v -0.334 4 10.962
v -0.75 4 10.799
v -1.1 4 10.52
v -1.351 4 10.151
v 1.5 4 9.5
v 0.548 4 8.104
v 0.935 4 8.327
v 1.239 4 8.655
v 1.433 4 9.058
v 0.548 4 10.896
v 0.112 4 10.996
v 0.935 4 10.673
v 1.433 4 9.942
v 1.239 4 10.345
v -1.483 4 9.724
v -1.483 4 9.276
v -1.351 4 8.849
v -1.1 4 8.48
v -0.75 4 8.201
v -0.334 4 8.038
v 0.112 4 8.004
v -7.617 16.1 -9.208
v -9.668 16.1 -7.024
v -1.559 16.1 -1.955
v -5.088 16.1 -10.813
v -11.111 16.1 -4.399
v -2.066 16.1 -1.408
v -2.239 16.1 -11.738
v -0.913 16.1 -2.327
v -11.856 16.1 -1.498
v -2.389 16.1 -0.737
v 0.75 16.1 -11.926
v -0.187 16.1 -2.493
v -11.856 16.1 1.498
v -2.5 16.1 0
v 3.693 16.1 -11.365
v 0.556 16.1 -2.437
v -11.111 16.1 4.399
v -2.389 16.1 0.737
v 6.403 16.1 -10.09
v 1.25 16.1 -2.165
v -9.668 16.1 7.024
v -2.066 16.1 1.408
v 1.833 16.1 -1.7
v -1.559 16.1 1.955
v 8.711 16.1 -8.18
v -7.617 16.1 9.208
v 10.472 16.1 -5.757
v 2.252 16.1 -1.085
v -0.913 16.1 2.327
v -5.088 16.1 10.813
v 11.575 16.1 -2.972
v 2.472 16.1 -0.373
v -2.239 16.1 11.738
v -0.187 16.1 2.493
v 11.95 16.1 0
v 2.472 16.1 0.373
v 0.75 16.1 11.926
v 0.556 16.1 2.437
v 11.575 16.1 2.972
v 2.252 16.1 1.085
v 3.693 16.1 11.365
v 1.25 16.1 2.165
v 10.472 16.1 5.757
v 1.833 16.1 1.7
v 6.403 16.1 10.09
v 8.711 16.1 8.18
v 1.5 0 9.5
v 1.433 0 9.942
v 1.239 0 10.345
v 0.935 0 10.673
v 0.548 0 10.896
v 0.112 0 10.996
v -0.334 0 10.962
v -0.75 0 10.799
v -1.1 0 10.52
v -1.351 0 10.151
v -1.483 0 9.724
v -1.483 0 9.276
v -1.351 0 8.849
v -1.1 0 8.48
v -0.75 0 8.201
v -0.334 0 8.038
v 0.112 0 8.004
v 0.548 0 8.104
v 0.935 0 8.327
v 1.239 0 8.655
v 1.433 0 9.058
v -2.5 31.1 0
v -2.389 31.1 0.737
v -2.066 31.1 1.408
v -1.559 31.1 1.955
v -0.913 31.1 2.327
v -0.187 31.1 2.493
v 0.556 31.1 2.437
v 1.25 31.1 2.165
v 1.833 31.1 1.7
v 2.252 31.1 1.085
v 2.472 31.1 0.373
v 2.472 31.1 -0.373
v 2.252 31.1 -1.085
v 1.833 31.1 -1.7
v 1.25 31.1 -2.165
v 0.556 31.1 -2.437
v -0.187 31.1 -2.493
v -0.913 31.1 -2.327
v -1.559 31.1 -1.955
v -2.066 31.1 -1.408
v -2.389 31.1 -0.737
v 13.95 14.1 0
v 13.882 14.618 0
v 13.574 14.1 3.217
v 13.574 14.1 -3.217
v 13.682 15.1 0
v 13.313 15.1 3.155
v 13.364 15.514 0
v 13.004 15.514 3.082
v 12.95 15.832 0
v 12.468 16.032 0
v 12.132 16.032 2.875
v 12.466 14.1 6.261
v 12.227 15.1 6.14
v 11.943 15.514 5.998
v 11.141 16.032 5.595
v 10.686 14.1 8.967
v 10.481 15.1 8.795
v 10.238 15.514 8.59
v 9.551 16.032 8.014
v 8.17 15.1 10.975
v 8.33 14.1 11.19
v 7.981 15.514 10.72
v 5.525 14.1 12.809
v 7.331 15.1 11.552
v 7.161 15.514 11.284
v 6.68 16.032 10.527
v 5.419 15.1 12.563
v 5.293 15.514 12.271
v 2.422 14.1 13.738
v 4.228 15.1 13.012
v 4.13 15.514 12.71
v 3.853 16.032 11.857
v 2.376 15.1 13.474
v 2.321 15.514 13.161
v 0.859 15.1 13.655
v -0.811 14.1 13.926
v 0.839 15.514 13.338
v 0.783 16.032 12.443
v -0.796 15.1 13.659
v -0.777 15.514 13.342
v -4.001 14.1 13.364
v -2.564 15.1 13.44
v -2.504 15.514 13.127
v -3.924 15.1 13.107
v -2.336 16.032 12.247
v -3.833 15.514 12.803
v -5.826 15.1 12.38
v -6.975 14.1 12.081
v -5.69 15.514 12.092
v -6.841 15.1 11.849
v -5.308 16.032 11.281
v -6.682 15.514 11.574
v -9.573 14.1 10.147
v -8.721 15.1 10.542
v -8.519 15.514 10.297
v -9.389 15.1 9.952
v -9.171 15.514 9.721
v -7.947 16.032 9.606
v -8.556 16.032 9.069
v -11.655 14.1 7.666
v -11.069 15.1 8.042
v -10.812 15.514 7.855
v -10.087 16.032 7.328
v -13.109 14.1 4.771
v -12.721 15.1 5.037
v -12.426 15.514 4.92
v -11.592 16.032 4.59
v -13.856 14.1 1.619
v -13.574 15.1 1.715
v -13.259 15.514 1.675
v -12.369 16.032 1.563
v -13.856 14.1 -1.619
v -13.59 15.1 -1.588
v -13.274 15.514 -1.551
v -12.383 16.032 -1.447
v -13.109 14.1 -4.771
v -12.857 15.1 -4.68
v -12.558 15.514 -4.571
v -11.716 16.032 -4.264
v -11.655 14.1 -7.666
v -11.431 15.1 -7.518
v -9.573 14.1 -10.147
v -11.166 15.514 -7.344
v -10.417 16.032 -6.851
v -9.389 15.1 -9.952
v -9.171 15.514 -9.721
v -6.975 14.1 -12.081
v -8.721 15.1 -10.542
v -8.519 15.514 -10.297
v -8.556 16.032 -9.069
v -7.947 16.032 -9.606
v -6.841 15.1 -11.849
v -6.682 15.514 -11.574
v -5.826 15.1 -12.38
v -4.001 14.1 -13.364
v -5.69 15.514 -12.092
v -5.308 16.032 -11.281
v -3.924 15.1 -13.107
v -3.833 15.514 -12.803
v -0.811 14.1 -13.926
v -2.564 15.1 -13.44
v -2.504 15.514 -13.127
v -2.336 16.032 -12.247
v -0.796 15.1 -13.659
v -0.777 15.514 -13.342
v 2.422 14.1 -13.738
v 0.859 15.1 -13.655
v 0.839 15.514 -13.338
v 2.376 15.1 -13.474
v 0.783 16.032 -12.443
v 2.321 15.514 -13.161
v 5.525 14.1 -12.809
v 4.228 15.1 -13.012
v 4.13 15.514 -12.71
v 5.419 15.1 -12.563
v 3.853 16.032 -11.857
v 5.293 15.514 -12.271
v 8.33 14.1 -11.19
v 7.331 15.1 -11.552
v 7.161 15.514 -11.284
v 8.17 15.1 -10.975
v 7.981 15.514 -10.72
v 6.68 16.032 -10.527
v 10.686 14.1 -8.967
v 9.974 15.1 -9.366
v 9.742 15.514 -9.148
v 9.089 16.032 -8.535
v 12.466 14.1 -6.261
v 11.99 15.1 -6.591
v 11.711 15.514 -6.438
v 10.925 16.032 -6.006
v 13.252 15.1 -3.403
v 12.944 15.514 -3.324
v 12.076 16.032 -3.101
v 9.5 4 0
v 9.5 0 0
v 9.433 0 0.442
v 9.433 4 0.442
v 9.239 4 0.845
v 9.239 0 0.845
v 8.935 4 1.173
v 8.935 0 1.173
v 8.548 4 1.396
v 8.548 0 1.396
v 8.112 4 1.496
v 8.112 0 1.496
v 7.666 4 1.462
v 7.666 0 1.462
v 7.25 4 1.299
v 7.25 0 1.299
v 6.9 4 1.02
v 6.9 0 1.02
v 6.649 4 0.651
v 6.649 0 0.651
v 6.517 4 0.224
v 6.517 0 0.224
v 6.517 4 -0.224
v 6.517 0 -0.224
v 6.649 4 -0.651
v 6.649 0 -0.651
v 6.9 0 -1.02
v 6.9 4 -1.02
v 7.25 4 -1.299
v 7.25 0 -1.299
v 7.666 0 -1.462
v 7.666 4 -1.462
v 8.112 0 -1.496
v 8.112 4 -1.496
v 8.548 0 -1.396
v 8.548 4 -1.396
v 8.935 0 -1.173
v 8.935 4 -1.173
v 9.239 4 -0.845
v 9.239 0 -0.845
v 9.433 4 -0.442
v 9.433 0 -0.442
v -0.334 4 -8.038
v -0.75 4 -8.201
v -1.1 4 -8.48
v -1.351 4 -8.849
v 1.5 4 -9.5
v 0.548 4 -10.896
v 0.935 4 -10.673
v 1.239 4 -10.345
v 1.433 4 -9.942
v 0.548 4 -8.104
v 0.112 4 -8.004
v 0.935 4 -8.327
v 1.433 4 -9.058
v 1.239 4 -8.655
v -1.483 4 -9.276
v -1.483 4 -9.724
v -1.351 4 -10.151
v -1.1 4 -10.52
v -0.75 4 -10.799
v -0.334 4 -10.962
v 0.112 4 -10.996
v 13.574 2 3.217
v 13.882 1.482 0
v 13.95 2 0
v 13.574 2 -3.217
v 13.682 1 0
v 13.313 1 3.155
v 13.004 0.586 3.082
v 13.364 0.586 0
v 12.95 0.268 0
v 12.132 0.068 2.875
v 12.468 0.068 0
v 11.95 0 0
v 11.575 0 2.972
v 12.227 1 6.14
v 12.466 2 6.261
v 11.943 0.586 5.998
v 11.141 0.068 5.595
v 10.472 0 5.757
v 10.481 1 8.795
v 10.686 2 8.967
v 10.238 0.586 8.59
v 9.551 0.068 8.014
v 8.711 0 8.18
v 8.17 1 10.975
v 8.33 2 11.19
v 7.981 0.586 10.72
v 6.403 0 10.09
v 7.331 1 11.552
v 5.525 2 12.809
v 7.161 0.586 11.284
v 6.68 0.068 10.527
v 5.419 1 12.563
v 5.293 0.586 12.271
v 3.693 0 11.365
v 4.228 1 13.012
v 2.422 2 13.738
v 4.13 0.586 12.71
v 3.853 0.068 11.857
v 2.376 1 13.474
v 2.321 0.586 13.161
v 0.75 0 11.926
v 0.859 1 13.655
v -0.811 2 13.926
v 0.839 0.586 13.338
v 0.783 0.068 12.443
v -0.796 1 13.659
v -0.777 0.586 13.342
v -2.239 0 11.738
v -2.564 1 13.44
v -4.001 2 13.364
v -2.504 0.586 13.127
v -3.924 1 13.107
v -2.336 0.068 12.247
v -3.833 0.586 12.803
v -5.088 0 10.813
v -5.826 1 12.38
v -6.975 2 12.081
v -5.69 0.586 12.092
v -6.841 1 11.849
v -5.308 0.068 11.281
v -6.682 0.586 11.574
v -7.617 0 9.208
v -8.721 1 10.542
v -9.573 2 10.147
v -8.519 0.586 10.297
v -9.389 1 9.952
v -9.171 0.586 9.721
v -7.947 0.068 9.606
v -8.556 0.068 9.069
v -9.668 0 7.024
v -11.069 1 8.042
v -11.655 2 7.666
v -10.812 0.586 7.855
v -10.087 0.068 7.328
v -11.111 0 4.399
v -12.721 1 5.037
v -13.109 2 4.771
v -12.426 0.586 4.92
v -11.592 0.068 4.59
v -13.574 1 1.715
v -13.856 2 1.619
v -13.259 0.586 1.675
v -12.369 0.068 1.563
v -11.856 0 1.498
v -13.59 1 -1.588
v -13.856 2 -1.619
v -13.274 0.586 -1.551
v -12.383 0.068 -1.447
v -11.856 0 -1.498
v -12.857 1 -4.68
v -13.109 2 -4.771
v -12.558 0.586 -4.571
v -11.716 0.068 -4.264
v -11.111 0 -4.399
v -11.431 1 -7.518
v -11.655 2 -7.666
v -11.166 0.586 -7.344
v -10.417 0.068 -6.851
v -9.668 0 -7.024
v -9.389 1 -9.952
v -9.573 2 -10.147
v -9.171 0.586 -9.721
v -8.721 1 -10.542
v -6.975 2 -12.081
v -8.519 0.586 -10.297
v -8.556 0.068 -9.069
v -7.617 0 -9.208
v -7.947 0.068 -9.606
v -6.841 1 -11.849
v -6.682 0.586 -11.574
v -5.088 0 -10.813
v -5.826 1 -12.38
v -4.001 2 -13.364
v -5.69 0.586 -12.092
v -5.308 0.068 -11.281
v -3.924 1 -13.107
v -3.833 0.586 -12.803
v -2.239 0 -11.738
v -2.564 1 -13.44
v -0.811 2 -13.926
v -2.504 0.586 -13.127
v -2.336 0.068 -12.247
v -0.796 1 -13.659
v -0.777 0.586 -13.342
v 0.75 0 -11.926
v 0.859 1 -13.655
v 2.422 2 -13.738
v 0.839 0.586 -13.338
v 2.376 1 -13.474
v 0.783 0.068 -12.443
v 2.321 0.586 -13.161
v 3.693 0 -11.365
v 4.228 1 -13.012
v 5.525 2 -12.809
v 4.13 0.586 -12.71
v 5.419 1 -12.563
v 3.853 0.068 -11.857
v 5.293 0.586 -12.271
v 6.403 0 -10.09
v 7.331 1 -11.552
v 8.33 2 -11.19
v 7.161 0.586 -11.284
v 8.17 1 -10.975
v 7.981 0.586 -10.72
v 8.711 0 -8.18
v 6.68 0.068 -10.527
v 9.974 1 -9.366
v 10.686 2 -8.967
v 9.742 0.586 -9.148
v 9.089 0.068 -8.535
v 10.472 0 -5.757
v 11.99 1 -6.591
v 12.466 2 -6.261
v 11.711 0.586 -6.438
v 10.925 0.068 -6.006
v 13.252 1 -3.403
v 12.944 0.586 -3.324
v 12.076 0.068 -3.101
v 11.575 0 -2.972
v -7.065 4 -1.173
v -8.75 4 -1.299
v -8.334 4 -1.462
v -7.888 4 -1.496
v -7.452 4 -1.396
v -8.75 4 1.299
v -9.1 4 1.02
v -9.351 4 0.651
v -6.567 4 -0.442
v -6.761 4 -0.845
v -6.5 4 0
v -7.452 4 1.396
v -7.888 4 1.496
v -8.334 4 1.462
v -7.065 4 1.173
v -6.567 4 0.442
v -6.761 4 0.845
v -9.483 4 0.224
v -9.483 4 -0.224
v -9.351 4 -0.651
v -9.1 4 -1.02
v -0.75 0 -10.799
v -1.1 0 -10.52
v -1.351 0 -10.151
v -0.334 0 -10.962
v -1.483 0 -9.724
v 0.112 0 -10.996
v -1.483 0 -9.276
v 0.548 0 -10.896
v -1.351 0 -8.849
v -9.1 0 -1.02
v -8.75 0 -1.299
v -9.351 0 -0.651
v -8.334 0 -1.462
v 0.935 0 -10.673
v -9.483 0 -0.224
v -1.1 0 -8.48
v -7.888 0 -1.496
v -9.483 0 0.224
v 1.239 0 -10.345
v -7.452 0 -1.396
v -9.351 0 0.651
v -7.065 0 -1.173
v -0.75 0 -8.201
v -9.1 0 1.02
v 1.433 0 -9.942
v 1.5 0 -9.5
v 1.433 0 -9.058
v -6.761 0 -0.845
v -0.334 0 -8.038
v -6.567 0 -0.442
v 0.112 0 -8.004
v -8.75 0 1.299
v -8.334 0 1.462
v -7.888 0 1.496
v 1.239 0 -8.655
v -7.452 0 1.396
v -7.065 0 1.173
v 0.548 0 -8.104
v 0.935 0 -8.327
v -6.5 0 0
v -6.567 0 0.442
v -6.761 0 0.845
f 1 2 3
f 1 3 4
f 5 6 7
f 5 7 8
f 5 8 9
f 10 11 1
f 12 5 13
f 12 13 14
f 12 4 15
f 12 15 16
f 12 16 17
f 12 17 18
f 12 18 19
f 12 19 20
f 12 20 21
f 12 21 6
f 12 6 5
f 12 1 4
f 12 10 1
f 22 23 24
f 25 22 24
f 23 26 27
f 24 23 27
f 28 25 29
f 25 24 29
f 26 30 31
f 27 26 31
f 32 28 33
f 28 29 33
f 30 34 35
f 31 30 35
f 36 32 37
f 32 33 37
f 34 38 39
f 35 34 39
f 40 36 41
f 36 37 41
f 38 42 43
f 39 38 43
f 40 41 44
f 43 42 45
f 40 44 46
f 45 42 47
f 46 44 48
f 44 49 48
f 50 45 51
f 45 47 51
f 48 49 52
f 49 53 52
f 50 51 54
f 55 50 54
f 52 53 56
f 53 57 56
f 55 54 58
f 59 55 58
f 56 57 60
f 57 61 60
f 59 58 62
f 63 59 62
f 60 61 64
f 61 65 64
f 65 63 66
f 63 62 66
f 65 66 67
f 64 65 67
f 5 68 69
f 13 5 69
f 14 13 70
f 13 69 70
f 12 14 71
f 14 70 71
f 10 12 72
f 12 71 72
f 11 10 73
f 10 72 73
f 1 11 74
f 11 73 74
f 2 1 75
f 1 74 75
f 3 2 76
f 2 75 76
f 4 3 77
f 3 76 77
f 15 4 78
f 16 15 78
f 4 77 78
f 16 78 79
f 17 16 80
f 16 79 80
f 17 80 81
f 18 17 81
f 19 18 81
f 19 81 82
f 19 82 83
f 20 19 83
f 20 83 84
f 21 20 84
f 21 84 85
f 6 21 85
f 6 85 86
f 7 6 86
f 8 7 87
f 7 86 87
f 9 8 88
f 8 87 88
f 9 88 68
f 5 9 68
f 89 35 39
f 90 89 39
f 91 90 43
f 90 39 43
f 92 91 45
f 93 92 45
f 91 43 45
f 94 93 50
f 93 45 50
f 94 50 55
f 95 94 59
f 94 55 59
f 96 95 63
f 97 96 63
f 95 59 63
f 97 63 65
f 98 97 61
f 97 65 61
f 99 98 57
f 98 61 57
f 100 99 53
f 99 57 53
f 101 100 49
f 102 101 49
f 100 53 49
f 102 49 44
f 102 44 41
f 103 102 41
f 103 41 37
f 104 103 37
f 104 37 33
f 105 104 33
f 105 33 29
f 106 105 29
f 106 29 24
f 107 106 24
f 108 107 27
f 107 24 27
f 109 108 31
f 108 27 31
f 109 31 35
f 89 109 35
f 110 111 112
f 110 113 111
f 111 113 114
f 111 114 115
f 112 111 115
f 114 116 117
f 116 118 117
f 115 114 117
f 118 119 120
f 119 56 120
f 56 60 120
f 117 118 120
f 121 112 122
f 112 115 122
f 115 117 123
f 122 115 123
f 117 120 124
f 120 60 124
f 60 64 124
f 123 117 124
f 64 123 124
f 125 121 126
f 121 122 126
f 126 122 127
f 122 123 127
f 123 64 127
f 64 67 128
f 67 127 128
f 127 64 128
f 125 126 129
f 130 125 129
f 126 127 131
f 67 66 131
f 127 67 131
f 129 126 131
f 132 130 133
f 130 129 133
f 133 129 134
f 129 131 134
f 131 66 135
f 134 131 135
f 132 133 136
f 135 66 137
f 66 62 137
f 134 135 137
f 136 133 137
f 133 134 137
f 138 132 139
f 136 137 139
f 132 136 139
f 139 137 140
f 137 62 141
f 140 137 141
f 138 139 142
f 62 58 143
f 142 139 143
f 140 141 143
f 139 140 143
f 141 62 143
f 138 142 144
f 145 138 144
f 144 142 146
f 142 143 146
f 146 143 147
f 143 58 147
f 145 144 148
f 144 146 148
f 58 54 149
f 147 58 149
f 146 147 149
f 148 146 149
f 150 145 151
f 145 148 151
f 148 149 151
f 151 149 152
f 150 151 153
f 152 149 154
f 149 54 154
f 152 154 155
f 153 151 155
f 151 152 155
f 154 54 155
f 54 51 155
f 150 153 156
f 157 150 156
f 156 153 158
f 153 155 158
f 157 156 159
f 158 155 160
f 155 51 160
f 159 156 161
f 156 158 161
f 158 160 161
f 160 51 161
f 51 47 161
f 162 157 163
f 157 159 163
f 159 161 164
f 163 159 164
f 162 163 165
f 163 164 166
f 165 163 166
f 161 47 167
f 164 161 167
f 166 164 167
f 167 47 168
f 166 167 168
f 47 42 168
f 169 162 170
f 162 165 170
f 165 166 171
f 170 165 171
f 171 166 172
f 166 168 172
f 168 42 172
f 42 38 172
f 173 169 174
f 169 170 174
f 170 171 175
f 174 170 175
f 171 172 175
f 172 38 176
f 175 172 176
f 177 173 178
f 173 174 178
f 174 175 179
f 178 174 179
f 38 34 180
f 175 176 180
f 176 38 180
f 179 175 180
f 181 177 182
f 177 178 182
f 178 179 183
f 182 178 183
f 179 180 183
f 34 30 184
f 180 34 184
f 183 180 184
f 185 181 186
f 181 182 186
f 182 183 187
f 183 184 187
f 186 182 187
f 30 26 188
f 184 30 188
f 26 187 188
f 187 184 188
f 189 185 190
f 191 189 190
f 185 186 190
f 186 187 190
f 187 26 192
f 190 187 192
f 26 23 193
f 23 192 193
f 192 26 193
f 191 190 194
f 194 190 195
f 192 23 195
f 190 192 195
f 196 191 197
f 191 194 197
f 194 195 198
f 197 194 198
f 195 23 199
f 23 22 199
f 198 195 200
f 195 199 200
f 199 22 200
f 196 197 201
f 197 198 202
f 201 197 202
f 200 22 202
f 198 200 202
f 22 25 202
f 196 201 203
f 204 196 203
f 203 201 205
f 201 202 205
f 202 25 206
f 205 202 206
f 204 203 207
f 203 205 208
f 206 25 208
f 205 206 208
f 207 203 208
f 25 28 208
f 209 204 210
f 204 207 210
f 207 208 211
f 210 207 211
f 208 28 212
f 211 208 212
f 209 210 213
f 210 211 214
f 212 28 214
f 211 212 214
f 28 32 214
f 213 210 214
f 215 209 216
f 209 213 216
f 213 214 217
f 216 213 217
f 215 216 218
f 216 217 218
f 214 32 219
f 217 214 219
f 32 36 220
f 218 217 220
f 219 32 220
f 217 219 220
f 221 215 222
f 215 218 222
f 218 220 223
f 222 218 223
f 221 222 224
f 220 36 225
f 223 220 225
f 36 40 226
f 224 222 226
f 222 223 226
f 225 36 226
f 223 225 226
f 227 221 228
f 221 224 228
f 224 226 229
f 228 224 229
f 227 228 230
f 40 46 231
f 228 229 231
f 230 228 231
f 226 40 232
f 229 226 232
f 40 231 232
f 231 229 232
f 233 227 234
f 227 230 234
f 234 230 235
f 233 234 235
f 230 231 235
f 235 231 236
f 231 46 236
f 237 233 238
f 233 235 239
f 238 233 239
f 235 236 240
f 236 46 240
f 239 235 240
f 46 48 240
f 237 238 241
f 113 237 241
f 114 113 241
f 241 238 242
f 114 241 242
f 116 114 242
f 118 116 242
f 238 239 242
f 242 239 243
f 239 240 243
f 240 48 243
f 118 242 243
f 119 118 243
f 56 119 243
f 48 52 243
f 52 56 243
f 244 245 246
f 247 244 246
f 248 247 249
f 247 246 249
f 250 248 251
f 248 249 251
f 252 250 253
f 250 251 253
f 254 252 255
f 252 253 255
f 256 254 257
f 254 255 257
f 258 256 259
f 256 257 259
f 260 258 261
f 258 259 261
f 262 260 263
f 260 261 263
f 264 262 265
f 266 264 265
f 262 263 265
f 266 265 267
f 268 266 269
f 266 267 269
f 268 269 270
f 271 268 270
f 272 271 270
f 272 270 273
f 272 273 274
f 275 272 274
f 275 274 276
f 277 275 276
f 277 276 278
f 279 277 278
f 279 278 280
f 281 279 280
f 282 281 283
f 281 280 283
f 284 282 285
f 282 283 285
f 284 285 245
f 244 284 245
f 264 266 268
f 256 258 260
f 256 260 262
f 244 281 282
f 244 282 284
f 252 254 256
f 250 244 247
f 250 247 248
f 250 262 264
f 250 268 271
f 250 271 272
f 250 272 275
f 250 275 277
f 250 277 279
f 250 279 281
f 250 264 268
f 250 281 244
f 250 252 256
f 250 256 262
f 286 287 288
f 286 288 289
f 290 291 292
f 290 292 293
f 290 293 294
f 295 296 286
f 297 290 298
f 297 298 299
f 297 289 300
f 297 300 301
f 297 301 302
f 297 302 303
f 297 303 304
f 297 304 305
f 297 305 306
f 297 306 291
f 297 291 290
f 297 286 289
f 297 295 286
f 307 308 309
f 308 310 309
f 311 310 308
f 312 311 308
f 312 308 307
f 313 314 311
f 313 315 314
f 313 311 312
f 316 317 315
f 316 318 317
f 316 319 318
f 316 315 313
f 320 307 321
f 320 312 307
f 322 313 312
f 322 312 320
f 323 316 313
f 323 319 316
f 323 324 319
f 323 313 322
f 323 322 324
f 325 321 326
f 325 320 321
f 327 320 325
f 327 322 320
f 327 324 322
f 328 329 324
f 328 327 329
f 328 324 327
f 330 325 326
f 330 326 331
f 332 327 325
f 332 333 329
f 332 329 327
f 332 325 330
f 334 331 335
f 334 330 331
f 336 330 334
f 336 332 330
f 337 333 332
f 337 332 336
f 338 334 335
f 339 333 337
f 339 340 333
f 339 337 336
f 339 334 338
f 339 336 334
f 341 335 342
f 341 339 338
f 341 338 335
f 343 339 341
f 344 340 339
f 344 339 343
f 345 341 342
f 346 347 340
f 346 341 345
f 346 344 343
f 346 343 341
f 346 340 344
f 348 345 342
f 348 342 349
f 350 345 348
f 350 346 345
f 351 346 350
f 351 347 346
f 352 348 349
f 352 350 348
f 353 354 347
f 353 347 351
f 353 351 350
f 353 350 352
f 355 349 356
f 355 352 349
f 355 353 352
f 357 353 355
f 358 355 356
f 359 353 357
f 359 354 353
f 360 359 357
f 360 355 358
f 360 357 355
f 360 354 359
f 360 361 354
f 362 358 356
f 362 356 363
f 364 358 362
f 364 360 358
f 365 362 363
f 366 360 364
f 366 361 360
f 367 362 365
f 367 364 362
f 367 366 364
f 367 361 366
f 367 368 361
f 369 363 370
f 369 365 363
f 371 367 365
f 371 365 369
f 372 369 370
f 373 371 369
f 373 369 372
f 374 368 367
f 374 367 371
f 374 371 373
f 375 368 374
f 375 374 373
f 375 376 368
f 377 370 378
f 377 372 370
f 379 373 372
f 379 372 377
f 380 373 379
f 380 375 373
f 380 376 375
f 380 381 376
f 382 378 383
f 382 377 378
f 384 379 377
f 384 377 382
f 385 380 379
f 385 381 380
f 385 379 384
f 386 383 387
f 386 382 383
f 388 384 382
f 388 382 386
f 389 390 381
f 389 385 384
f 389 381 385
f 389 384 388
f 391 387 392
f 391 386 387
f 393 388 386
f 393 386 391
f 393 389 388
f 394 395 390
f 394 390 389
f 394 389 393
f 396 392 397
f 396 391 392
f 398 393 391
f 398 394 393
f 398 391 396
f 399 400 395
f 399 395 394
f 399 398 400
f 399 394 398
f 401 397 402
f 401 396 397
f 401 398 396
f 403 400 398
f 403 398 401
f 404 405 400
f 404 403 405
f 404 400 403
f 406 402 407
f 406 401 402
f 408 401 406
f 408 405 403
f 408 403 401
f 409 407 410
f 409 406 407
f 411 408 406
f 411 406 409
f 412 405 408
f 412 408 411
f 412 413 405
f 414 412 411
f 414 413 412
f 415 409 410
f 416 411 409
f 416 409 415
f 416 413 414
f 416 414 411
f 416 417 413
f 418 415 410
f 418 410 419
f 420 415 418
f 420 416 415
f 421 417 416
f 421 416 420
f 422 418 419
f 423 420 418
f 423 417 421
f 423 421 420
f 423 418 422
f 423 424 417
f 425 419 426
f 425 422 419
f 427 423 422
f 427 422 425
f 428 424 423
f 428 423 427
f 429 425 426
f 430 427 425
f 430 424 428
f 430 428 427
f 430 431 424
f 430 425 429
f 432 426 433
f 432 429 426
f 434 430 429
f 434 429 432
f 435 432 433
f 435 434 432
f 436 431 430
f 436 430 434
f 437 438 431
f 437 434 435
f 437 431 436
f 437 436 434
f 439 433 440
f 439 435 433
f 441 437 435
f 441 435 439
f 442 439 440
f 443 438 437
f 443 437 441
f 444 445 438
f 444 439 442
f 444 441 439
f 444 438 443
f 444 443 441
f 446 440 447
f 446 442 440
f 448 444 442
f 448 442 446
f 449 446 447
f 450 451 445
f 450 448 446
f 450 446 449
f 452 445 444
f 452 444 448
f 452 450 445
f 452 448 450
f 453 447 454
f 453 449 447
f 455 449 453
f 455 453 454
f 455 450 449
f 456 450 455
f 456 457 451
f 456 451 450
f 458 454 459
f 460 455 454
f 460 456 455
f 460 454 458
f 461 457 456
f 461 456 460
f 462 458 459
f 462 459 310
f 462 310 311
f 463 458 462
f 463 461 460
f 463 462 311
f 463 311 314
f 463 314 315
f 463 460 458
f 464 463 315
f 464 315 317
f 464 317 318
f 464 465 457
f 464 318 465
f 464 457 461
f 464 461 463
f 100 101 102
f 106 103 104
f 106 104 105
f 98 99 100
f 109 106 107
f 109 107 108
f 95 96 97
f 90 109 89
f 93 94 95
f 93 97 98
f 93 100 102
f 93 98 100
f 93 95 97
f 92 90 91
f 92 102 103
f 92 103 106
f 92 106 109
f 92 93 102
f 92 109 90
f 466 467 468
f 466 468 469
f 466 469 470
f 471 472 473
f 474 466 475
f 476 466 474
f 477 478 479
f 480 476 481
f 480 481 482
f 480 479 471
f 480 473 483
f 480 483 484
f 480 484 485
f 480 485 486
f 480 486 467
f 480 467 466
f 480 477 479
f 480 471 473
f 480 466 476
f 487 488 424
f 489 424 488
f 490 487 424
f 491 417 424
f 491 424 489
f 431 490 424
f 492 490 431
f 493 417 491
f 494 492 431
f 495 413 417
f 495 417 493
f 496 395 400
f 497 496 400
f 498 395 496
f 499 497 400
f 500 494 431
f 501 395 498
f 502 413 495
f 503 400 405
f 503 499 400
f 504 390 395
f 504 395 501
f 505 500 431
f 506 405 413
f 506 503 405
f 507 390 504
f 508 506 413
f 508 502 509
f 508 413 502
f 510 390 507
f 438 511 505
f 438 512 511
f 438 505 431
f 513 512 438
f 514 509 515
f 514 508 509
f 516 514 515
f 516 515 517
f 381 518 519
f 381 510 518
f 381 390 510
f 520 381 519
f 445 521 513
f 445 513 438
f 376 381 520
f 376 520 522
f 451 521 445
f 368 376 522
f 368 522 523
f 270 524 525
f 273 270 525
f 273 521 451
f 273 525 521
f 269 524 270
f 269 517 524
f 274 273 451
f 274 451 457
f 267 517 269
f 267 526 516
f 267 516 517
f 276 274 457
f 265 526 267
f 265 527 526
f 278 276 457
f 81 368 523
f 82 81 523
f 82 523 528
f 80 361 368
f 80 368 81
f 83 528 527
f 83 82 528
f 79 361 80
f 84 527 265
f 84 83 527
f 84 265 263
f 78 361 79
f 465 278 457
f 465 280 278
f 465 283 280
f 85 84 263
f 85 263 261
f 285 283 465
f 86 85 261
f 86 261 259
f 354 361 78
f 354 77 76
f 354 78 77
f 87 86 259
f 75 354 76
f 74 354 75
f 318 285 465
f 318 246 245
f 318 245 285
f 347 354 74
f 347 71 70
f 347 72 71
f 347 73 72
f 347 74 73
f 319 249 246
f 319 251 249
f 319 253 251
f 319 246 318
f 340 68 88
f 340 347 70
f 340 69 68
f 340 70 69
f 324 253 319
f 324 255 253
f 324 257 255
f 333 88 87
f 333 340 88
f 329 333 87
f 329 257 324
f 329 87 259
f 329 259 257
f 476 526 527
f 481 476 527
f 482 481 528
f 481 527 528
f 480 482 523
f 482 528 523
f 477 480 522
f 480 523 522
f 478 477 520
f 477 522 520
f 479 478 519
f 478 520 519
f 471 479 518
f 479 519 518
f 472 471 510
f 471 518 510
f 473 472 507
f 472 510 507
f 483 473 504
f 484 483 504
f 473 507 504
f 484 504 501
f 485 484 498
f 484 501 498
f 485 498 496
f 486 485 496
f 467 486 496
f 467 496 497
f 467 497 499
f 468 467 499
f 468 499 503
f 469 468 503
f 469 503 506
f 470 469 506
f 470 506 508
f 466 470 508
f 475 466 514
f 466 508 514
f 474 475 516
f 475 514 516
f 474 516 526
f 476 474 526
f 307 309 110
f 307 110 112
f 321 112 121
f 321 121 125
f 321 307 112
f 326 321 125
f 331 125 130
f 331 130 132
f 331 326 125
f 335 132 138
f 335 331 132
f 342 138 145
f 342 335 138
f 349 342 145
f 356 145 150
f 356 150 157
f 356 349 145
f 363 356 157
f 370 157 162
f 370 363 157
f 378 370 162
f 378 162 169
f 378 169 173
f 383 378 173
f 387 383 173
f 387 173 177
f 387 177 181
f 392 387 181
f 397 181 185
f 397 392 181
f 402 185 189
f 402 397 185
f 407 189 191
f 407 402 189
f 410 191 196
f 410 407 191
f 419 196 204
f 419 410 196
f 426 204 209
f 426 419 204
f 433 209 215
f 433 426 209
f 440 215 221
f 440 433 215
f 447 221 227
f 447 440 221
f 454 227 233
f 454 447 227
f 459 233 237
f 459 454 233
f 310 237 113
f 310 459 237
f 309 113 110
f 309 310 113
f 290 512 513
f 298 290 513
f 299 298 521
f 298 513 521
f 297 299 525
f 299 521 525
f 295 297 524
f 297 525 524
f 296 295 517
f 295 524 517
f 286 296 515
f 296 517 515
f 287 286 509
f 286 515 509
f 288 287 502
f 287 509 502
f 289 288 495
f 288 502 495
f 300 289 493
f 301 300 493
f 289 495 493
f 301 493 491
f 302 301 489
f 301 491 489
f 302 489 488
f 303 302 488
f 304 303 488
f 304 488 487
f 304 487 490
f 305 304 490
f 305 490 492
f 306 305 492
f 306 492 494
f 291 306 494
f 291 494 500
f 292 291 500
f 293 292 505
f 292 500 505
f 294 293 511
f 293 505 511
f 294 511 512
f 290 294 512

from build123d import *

# Parameters (mm, degrees)
F0_R     = 13.95
F1_DEPTH = 16.1
F2_R     = 2.5
F3_DEPTH = 15
F4_R     = 1.5
F5_DEPTH = 4
F6_R     = 2


with BuildPart() as f1:
    # F0 (on Front) → F1 (new body)
    with BuildSketch(Plane.XZ):
        Circle(F0_R)
    extrude(amount=-F1_DEPTH)

    # F2 (on face) → F3 (join)
    with BuildSketch(Plane(origin=(0, 16.1, 0), x_dir=(-1, 0, 0), z_dir=(0, 1, 0))):
        Circle(F2_R)
    extrude(amount=F3_DEPTH)

    # F4 (on face) → F5 (cut)
    with BuildSketch(Plane.XZ):
        with Locations((0, 9.5)):
            Circle(F4_R)
        with Locations((0, -9.5)):
            Circle(F4_R)
        with Locations((-8, 0)):
            Circle(F4_R)
        with Locations((8, 0)):
            Circle(F4_R)
    extrude(amount=-F5_DEPTH, mode=Mode.SUBTRACT)

    # F6
    f6_edges = [f1.edges().sort_by_distance(p)[0] for p in [
        (13.95, 8.05, 0),
        (-13.95, 0, 0),
        (-13.95, 16.1, 0),
    ]]
    fillet(f6_edges, radius=F6_R)


solid = f1.part
